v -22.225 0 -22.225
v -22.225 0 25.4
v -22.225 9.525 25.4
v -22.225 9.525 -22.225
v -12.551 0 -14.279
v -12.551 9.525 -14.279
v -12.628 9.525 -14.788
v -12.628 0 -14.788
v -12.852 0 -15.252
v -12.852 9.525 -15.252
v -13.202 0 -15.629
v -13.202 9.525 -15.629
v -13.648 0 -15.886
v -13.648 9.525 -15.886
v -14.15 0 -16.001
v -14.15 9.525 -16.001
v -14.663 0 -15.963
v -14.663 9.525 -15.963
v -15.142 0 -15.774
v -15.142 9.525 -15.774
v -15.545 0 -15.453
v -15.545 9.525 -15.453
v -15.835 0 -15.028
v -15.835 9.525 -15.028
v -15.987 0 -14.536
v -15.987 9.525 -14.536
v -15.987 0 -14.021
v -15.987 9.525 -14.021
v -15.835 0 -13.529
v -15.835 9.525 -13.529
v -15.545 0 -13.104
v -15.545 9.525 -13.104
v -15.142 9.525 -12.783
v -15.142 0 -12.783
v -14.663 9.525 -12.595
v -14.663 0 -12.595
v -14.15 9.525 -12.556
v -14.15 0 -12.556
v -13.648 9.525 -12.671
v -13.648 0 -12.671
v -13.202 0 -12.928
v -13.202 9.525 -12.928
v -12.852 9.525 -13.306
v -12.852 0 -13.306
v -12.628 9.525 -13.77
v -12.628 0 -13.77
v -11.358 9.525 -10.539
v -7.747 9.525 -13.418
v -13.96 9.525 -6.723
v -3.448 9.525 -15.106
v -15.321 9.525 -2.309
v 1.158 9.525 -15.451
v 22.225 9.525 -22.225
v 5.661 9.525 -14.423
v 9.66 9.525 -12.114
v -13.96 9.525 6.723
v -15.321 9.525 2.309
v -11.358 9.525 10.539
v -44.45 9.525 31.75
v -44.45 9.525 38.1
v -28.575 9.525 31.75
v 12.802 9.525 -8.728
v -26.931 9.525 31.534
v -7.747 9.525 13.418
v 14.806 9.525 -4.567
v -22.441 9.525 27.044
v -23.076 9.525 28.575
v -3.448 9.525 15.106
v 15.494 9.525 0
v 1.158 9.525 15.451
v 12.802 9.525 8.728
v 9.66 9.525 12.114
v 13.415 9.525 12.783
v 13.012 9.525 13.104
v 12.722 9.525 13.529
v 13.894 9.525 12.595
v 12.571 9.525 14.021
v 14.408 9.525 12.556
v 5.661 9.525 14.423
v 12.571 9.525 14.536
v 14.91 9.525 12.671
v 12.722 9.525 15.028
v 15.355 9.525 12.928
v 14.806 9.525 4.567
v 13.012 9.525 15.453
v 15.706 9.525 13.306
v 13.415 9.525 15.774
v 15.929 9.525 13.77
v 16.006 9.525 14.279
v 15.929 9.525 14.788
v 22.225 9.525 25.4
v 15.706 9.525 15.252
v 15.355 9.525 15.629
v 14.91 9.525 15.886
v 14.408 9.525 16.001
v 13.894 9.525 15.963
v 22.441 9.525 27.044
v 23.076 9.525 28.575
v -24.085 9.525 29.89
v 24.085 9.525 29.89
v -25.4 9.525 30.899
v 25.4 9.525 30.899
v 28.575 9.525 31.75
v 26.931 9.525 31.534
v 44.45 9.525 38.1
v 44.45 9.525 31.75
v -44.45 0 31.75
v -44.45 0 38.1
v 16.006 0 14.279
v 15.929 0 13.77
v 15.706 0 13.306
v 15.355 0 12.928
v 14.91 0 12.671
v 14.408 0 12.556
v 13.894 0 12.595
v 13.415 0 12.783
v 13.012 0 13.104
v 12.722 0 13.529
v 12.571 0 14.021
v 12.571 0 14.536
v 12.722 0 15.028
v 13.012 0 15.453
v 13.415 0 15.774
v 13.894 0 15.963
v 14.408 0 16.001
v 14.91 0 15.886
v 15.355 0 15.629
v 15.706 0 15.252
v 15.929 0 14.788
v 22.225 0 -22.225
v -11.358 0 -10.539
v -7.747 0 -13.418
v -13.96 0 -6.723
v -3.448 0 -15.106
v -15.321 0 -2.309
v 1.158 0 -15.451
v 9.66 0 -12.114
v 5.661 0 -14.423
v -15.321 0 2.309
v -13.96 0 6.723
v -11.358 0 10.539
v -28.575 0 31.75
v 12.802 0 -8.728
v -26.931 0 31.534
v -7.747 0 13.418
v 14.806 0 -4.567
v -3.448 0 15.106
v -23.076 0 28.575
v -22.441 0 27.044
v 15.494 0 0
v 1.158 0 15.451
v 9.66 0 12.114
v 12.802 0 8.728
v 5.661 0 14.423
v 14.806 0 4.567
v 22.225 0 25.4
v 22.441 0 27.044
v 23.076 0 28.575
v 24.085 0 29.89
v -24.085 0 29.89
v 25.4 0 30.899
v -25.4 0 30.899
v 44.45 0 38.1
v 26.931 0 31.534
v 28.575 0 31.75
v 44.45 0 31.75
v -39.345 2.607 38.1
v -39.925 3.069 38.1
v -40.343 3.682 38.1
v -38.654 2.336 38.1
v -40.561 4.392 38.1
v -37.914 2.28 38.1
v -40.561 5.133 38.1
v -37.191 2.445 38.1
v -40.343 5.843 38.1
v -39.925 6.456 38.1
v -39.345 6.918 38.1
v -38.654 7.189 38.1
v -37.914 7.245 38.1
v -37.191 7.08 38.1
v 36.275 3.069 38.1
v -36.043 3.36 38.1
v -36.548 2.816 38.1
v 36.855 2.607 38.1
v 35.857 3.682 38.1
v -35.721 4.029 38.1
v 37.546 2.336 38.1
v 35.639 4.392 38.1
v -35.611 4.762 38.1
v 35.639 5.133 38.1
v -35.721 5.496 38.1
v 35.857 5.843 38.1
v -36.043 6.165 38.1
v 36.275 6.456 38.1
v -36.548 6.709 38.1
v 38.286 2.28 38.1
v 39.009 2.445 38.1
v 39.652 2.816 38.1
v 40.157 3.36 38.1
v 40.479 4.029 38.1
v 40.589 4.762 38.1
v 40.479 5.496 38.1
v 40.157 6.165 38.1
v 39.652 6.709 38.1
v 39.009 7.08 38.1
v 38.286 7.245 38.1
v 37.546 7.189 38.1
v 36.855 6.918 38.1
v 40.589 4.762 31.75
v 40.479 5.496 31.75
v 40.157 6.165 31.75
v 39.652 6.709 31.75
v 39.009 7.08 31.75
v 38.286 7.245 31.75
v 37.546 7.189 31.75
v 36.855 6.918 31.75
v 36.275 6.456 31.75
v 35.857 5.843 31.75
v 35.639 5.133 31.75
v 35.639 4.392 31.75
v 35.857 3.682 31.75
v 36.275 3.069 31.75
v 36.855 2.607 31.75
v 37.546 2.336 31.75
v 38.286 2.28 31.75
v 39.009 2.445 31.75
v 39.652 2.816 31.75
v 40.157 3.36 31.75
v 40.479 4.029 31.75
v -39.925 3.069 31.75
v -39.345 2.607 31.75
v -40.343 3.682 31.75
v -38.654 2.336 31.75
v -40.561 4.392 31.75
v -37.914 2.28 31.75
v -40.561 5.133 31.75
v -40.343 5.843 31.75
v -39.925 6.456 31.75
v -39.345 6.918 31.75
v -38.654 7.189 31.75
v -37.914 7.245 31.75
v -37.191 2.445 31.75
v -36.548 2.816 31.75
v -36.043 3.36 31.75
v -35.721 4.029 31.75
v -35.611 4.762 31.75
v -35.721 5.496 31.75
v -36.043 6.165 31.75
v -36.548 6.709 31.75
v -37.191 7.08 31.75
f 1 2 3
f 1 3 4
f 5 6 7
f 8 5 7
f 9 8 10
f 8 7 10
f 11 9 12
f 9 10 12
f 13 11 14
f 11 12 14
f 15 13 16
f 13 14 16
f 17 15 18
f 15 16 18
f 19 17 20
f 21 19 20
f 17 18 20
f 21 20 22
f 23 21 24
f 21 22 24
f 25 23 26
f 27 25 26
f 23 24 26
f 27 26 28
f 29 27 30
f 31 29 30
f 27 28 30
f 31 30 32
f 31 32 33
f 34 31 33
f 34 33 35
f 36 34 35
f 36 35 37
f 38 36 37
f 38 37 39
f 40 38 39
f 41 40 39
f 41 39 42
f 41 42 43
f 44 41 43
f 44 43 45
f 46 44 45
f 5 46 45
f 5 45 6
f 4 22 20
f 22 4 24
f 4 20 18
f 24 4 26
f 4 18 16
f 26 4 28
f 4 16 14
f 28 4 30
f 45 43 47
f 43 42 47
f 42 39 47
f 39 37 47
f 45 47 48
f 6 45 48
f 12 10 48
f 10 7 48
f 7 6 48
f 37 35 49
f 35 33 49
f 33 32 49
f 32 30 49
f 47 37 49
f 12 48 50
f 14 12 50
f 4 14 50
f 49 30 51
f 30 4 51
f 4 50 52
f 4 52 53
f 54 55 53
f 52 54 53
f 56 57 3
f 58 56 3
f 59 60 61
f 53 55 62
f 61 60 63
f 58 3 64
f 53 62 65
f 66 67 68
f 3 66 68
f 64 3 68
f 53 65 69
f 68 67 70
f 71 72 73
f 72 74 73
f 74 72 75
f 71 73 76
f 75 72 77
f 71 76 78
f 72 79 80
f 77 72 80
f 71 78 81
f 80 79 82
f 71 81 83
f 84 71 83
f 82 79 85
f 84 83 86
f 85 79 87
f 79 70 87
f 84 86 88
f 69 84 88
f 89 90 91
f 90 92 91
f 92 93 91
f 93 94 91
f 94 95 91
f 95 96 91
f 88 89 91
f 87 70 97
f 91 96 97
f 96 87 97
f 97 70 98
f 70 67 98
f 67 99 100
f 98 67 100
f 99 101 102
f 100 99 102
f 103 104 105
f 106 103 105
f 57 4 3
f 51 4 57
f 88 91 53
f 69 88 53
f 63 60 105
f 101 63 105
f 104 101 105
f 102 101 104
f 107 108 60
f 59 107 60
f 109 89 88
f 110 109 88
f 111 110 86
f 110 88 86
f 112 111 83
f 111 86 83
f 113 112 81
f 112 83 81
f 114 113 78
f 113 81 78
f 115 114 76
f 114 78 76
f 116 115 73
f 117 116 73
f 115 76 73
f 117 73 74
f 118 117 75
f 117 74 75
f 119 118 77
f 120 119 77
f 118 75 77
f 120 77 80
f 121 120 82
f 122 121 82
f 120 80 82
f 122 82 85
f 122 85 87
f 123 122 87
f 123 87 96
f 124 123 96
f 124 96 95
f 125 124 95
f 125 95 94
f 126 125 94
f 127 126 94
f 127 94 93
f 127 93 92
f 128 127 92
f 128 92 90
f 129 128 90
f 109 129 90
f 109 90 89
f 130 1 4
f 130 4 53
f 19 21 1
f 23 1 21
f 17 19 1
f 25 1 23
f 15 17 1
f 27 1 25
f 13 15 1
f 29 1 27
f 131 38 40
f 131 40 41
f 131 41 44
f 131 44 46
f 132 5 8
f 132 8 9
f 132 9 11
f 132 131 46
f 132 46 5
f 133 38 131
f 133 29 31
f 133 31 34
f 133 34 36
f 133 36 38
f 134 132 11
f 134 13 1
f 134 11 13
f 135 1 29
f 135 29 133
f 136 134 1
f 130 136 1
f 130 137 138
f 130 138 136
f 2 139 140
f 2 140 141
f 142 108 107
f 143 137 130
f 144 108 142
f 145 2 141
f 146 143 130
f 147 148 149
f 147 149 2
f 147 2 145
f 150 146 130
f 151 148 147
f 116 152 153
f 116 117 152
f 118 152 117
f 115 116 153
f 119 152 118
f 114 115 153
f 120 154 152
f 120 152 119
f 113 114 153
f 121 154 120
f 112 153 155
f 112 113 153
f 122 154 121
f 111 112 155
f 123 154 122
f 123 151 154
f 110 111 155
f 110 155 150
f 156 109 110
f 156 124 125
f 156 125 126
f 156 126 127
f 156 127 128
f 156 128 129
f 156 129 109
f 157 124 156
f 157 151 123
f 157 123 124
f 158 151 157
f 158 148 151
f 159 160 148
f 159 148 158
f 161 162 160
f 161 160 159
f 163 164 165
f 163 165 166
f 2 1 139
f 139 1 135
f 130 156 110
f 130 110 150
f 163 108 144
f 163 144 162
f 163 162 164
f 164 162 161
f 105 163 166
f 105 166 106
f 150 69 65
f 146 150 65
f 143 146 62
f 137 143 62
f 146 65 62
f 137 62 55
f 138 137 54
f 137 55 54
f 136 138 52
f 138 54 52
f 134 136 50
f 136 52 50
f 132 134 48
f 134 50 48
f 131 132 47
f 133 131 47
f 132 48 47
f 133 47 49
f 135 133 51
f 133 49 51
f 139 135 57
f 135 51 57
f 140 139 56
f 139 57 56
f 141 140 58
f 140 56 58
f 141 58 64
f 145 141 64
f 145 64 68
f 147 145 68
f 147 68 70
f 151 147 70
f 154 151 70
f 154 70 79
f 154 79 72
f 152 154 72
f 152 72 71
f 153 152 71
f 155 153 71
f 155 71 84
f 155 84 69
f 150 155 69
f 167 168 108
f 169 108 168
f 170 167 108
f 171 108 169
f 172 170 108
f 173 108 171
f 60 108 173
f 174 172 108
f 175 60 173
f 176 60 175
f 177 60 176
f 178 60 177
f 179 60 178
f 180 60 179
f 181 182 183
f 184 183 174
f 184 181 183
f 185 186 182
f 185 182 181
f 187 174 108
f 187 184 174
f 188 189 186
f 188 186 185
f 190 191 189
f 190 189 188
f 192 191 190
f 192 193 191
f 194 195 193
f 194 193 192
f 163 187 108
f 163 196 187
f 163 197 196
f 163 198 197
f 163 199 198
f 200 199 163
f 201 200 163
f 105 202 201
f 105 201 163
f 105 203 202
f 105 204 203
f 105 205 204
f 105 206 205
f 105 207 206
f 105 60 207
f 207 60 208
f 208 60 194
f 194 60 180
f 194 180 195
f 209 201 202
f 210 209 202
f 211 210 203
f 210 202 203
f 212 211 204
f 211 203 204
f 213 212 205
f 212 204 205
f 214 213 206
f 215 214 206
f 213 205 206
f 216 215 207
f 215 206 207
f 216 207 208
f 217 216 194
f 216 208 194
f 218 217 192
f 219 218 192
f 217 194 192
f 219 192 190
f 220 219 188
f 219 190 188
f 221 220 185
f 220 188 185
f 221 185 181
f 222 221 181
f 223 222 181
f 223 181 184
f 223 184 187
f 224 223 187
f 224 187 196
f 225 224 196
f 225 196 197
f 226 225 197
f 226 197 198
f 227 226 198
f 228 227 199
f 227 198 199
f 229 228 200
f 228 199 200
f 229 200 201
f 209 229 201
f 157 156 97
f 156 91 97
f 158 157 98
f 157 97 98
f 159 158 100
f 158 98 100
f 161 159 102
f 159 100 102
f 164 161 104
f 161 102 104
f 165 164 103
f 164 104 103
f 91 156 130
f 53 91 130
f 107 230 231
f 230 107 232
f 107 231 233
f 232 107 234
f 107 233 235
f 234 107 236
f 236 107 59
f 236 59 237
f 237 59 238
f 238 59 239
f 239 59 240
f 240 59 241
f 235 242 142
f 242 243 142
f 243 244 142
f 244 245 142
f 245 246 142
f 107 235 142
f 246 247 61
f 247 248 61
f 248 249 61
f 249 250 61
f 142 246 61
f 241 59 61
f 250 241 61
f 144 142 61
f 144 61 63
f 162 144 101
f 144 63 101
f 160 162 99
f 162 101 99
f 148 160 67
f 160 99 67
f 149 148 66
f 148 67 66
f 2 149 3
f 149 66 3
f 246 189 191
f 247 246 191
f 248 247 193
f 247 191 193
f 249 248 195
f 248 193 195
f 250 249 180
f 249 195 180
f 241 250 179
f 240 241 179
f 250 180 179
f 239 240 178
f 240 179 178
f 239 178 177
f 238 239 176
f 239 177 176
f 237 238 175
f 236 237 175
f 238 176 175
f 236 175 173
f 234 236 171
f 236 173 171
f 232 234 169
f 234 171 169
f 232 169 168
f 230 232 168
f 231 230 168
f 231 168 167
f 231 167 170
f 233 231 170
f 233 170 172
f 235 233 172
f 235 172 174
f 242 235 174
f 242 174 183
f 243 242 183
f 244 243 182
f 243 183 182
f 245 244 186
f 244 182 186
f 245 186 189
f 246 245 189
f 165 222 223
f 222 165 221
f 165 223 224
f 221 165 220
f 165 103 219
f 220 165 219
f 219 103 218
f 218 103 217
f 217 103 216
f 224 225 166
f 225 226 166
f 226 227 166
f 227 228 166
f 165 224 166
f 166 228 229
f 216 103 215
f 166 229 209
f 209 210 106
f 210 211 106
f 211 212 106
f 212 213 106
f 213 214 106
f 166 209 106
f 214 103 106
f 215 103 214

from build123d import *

# Parameters (mm, degrees)
SKETCH1_W             = 44.45
SKETCH1_H             = 60.325
BOSS_EXTRUDE1_DEPTH   = 9.525
SKETCH7_W             = 22.225
SKETCH7_H             = 9.525
BOSS_EXTRUDE3_DEPTH   = 6.35
FILLET1_R             = 6.35
SKETCH8_R             = 2.4892
CUT_EXTRUDE1_DEPTH    = 6.35
CUT_EXTRUDE2_REACH    = 11.525
SKETCH10_R            = 15.494
SKETCH10_R_2          = 1.7272
F_8_32_TAPPED_HOLE2_D = 3.4544


with BuildPart() as part:
    # Sketch1 → Boss-Extrude1 (new body)
    with BuildSketch(Plane(origin=(0, 0, 0), x_dir=(1, 0, 0), z_dir=(0, 1, 0))):
        with Locations((0, -7.9375)):
            Rectangle(SKETCH1_W, SKETCH1_H)
    extrude(amount=BOSS_EXTRUDE1_DEPTH)

    # Sketch7 → Boss-Extrude3 (add)
    with BuildSketch(Plane.XY.offset(38.1)):
        with Locations((-33.3375, 4.7625)):
            Rectangle(SKETCH7_W, SKETCH7_H)
        with Locations((33.3375, 4.7625)):
            Rectangle(SKETCH7_W, SKETCH7_H)
    extrude(amount=-BOSS_EXTRUDE3_DEPTH)

    # Fillet1
    fillet1_edges = [part.edges().sort_by_distance(p)[0] for p in [
        (-22.225, 4.7625, 31.75),
        (22.225, 4.7625, 31.75),
    ]]
    fillet(fillet1_edges, radius=FILLET1_R)

    # Sketch8 → Cut-Extrude1 (cut)
    with BuildSketch(Plane.XY.offset(38.1)):
        with Locations((-38.1, 4.7625)):
            Circle(SKETCH8_R)
        with Locations((38.1, 4.7625)):
            Circle(SKETCH8_R)
    extrude(amount=-CUT_EXTRUDE1_DEPTH, mode=Mode.SUBTRACT)

    # Sketch10 → Cut-Extrude2 (cut, up to next)
    with BuildSketch(Plane(origin=(0, 9.525, 0), x_dir=(1, 0, 0), z_dir=(0, 1, 0)), mode=Mode.PRIVATE) as cut_extrude2_sk1:
        Circle(SKETCH10_R)
    cut_extrude2_tool1 = extrude(cut_extrude2_sk1.sketch, amount=-CUT_EXTRUDE2_REACH, mode=Mode.PRIVATE) & part.part
    add(cut_extrude2_tool1.solids().sort_by_distance((0, 9.525, 0))[0], mode=Mode.SUBTRACT)
    # Sketch10 → Cut-Extrude2 (cut, up to next)
    with BuildSketch(Plane(origin=(0, 9.525, 0), x_dir=(1, 0, 0), z_dir=(0, 1, 0)), mode=Mode.PRIVATE) as cut_extrude2_sk2:
        with Locations((-14.278607233, 14.278607232)):
            Circle(SKETCH10_R_2)
    cut_extrude2_tool2 = extrude(cut_extrude2_sk2.sketch, amount=-CUT_EXTRUDE2_REACH, mode=Mode.PRIVATE) & part.part
    add(cut_extrude2_tool2.solids().sort_by_distance((-14.278607, 9.525, -14.278607))[0], mode=Mode.SUBTRACT)
    # Sketch10 → Cut-Extrude2 (cut, up to next)
    with BuildSketch(Plane(origin=(0, 9.525, 0), x_dir=(1, 0, 0), z_dir=(0, 1, 0)), mode=Mode.PRIVATE) as cut_extrude2_sk3:
        with Locations((14.278607232, -14.278607232)):
            Circle(SKETCH10_R_2)
    cut_extrude2_tool3 = extrude(cut_extrude2_sk3.sketch, amount=-CUT_EXTRUDE2_REACH, mode=Mode.PRIVATE) & part.part
    add(cut_extrude2_tool3.solids().sort_by_distance((14.278607, 9.525, 14.278607))[0], mode=Mode.SUBTRACT)

    # #8-32 Tapped Hole2 (through all)
    with Locations(Plane(origin=(0, 9.525, 0), x_dir=(1, 0, 0), z_dir=(0, 1, 0))):
        with Locations((-14.278607233, 14.278607232), (14.278607232, -14.278607232)):
            Hole(F_8_32_TAPPED_HOLE2_D / 2)


solid = part.part
